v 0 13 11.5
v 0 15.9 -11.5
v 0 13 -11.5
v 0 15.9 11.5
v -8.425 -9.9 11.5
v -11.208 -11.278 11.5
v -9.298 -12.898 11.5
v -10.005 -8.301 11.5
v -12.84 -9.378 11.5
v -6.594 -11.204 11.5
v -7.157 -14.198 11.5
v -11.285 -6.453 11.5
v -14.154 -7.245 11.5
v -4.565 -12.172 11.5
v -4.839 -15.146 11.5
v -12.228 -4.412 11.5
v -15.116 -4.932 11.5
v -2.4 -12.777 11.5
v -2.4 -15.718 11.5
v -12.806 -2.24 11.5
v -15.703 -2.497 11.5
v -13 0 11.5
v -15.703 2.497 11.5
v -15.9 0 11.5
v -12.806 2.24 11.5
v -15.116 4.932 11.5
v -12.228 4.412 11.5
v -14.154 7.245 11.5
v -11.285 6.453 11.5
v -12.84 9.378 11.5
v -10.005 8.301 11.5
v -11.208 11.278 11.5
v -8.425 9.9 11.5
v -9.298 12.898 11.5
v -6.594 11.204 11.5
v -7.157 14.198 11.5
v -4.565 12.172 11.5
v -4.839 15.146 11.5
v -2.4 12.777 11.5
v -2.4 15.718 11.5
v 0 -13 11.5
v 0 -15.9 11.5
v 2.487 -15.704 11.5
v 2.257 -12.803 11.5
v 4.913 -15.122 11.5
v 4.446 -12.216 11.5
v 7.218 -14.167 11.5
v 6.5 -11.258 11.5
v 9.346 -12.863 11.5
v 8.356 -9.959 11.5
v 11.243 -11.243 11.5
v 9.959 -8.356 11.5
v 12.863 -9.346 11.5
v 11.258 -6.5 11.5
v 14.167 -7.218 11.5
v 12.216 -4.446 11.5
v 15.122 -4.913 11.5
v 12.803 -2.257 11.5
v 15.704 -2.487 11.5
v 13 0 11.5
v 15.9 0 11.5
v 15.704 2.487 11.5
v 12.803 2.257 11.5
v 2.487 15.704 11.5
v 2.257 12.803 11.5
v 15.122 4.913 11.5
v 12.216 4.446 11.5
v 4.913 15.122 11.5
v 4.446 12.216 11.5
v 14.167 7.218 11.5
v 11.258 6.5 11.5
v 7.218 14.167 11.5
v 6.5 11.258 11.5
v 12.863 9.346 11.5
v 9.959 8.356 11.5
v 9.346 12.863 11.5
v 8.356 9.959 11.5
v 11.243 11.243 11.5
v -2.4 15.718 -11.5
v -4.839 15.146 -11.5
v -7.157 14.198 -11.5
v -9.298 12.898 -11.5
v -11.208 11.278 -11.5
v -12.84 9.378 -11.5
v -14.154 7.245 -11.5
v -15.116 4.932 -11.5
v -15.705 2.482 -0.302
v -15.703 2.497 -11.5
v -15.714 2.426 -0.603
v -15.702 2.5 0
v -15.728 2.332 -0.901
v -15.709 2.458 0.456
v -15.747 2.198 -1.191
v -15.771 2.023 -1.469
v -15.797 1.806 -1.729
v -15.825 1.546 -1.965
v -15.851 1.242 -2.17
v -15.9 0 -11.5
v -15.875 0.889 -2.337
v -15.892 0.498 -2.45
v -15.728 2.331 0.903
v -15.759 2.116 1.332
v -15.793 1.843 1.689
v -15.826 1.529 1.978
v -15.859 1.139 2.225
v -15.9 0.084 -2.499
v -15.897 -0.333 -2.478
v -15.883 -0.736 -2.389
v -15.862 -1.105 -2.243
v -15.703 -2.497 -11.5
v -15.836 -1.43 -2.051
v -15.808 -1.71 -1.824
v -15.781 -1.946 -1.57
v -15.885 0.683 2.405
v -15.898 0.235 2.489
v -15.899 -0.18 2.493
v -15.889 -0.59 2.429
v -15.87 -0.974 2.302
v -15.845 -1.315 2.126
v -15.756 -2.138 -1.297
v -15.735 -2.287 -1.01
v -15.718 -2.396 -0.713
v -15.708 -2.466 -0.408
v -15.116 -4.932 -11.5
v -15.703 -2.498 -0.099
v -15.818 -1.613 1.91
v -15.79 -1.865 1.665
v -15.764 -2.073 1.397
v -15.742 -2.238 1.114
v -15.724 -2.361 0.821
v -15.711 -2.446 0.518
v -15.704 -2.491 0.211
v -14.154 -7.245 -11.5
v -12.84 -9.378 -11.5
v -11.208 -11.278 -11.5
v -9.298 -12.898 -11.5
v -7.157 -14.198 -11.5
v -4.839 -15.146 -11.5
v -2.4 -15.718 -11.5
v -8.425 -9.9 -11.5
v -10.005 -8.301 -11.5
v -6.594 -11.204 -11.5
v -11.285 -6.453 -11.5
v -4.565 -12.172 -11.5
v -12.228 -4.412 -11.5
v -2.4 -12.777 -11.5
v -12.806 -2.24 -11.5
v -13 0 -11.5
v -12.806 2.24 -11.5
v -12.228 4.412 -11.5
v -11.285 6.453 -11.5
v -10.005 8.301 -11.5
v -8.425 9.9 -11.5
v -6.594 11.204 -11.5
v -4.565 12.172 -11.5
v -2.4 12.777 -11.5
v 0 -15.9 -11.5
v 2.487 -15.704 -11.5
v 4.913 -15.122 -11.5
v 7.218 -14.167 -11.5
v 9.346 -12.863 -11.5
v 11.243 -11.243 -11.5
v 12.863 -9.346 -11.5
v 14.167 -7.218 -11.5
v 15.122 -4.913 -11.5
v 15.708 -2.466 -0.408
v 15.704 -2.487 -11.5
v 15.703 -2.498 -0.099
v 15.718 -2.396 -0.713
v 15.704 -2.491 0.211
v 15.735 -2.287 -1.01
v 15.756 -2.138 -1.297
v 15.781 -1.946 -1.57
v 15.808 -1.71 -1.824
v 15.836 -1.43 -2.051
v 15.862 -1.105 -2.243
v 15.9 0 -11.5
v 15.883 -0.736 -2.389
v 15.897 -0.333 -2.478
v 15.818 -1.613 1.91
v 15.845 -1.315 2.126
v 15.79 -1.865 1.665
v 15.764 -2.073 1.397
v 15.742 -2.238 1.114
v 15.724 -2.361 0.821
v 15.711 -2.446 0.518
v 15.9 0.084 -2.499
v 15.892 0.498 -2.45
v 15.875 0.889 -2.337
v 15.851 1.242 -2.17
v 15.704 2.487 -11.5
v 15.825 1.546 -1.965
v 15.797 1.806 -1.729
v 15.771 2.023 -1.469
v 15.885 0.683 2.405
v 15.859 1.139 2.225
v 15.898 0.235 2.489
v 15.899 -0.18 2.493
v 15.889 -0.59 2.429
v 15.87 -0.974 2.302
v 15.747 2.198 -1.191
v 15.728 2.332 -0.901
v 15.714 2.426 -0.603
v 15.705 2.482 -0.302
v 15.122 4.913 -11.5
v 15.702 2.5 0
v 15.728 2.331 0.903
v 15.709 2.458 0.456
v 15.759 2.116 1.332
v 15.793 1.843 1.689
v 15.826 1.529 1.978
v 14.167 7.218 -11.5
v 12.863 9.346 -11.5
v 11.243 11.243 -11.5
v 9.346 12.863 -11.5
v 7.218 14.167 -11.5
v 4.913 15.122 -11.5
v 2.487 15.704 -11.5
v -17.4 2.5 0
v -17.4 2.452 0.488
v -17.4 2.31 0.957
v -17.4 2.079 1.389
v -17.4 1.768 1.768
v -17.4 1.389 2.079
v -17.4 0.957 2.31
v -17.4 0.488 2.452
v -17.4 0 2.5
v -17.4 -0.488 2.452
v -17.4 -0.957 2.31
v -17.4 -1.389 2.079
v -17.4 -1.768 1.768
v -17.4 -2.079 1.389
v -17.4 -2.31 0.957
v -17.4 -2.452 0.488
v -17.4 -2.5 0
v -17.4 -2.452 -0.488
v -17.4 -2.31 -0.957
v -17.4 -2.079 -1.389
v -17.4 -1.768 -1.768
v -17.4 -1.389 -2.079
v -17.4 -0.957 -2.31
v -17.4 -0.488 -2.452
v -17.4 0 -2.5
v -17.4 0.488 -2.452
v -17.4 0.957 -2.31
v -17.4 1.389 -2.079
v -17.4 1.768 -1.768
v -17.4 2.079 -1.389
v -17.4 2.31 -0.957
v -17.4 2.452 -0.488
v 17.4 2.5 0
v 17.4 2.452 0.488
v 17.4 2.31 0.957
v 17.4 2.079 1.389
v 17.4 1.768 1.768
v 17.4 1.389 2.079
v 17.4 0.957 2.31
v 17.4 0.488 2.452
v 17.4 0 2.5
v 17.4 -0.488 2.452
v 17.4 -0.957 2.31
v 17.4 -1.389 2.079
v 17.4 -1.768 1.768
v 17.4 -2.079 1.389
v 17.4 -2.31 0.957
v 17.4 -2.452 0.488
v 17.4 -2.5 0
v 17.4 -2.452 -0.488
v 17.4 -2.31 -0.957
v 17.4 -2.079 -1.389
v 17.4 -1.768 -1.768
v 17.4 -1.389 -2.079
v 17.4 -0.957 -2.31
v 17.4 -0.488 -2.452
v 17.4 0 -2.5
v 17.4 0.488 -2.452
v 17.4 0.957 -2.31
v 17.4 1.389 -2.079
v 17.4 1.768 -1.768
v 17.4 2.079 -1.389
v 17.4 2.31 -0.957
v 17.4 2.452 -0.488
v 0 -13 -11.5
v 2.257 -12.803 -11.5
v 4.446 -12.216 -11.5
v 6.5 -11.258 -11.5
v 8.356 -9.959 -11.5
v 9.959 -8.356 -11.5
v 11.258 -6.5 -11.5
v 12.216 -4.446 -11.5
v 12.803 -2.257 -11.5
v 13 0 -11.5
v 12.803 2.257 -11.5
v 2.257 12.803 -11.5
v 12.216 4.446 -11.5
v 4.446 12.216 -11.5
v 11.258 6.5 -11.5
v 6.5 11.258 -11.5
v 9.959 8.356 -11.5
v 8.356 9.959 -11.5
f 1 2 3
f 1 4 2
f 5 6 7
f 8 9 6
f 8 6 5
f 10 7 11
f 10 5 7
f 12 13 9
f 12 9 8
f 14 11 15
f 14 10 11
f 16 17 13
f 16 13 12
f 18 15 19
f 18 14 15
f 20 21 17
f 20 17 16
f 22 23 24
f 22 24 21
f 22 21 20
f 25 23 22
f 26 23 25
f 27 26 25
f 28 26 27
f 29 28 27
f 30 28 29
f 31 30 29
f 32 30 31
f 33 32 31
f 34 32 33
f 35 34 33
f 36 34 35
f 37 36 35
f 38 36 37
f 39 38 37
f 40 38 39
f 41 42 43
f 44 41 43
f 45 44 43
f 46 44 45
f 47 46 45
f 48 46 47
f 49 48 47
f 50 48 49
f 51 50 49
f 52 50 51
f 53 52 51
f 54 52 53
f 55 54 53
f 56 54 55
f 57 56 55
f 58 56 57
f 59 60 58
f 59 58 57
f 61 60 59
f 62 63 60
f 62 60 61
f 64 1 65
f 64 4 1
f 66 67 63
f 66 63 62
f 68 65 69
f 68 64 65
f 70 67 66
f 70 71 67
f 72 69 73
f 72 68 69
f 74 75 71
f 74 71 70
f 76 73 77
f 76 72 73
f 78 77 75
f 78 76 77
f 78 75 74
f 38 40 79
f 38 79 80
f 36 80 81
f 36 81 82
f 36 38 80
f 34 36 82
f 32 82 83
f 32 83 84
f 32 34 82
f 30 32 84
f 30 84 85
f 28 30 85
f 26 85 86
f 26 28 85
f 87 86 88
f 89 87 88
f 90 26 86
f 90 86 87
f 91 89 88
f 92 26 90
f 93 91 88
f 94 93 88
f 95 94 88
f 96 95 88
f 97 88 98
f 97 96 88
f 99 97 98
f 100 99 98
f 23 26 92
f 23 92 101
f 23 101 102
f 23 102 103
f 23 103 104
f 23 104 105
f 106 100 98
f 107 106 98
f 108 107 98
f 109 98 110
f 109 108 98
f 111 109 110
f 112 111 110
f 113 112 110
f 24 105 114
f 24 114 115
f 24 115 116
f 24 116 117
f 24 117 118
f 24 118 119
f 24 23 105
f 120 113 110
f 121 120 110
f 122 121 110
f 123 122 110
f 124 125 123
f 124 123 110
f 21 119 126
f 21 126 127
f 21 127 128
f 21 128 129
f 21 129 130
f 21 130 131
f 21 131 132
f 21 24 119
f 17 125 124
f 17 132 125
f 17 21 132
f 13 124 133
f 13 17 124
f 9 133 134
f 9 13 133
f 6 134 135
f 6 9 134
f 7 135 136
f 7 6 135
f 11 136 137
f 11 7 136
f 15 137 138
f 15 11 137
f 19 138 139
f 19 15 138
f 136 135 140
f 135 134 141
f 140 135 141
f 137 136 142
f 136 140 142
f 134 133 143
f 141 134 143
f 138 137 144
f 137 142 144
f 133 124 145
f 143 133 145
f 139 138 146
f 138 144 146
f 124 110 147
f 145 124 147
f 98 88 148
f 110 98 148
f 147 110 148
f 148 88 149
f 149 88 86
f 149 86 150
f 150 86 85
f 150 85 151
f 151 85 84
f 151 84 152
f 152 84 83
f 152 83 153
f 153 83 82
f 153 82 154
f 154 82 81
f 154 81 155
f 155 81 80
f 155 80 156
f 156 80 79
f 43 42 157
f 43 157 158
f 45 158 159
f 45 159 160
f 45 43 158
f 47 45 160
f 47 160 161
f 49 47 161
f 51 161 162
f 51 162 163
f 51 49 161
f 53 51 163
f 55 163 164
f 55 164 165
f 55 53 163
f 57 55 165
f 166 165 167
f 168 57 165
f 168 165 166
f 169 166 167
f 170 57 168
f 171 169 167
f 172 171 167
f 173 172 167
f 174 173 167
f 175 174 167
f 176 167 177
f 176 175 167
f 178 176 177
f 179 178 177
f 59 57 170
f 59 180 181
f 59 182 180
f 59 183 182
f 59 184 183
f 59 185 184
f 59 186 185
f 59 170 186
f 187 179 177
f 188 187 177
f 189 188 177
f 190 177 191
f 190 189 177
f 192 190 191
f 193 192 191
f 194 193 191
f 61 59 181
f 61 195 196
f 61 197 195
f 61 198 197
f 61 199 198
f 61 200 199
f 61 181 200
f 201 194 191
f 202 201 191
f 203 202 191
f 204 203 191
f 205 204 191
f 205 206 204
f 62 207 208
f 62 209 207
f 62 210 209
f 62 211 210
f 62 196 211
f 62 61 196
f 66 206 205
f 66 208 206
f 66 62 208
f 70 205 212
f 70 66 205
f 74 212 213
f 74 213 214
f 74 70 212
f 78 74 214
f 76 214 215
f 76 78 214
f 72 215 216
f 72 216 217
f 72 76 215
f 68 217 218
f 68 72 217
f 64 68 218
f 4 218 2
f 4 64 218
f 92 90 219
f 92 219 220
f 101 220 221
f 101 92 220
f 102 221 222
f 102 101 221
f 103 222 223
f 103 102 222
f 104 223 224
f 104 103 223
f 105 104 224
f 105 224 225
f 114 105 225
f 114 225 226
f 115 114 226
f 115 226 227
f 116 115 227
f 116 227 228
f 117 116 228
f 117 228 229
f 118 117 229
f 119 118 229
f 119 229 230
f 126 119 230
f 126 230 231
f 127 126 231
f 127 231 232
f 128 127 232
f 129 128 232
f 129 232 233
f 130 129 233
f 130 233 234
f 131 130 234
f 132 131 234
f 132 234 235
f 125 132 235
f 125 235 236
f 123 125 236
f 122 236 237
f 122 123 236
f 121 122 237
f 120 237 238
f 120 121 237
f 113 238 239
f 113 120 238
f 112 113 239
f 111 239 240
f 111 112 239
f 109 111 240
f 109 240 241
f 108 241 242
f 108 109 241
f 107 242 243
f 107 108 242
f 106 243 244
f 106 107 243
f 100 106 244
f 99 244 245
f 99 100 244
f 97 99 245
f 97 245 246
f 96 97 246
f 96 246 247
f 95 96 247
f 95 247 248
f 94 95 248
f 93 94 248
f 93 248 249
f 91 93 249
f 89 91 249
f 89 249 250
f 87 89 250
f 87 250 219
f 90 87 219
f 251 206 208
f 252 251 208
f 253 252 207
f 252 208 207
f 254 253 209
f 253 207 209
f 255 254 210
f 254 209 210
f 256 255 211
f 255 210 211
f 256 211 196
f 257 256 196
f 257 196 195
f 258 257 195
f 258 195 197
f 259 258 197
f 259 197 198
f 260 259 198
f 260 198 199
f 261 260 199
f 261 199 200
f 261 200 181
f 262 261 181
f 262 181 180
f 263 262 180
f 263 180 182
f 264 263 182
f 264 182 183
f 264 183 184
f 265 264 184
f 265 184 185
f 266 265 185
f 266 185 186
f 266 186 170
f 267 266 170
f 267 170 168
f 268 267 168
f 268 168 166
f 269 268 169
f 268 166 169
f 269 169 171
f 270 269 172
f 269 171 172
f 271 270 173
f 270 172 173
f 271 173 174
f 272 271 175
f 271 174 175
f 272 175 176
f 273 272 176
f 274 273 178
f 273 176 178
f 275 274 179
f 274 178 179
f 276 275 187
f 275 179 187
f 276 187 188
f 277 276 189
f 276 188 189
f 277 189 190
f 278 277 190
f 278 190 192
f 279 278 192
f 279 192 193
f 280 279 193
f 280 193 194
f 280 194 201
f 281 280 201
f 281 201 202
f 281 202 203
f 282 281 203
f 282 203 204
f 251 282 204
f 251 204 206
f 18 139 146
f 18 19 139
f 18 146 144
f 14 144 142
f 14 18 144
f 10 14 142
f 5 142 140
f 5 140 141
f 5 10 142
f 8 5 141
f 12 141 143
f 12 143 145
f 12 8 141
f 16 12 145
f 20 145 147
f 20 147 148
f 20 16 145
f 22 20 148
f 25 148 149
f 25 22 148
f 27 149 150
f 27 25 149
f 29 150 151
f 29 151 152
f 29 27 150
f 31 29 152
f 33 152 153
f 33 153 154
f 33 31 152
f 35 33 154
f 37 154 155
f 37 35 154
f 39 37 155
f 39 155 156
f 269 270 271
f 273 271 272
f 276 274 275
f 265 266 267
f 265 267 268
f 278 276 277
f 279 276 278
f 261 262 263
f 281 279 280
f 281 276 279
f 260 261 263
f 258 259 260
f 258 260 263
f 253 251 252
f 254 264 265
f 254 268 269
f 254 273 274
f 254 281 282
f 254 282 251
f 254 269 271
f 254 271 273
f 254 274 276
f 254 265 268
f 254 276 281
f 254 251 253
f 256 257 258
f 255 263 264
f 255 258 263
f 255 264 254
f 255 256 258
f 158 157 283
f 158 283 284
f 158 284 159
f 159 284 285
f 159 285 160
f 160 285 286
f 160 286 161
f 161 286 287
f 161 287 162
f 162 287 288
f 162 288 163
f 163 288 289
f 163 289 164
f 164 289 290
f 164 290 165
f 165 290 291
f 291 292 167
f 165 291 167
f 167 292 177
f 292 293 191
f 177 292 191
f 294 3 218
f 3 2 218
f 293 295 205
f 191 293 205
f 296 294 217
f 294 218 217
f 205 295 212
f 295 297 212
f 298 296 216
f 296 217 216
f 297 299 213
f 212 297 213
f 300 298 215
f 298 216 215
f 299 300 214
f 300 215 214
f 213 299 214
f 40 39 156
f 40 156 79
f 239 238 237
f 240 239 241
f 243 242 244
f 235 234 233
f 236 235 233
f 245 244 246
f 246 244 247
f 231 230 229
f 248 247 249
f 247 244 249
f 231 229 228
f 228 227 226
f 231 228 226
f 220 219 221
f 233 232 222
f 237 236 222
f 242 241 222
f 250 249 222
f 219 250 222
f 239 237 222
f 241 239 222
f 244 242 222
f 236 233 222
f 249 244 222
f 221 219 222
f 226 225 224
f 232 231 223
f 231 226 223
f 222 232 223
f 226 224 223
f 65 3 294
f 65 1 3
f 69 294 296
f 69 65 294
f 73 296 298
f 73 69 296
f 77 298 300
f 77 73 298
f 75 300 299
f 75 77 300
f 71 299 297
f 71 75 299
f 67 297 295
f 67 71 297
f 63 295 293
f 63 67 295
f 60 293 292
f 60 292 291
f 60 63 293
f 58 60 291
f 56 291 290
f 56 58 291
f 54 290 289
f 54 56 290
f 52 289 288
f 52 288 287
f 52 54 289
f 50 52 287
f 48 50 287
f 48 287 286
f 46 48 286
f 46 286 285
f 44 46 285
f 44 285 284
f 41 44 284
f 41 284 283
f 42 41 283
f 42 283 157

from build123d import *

# Parameters (mm, degrees)
F1_DEPTH      = 11.5
F1_DEPTH_BACK = 11.5
F2_DEPTH      = 11.5
F2_DEPTH_BACK = 11.5
F4_START      = 15
F3_R          = 2.5
F4_DEPTH      = 2.4
F5_START      = -15
F5_DEPTH      = 2.4


with BuildPart() as f1:
    # F0 (on Top) → F1 (new body, two sides)
    with BuildSketch(Plane.XY) as f1_sk:
        with BuildLine():
            ThreePointArc((-2.4, -12.7765410029), (-13, 0), (-2.4, 12.7765410029))
            Line((-2.4, 12.7765410029), (-2.4, 15.7178242769))
            ThreePointArc((-2.4, 15.7178242769), (-15.9, 0), (-2.4, -15.7178242769))
            Line((-2.4, -15.7178242769), (-2.4, -12.7765410029))
        make_face()
    extrude(amount=F1_DEPTH)
    extrude(f1_sk.sketch, amount=-F1_DEPTH_BACK)

    # F3 (on Right) → F5 (join)
    with BuildSketch(Plane.YZ.offset(F5_START)):
        Circle(F3_R)
    extrude(amount=-F5_DEPTH)


with BuildPart() as f2:
    # F0 (on Top) → F2 (new body, two sides)
    with BuildSketch(Plane.XY) as f2_sk:
        with BuildLine():
            ThreePointArc((0, 13), (13, 0), (0, -13))
            Line((0, -13), (0, -15.9))
            ThreePointArc((0, -15.9), (15.9, 0), (0, 15.9))
            Line((0, 15.9), (0, 13))
        make_face()
    extrude(amount=F2_DEPTH)
    extrude(f2_sk.sketch, amount=-F2_DEPTH_BACK)

    # F3 (on Right) → F4 (join)
    with BuildSketch(Plane.YZ.offset(F4_START)):
        Circle(F3_R)
    extrude(amount=F4_DEPTH)


solid = Compound([f1.part, f2.part])
